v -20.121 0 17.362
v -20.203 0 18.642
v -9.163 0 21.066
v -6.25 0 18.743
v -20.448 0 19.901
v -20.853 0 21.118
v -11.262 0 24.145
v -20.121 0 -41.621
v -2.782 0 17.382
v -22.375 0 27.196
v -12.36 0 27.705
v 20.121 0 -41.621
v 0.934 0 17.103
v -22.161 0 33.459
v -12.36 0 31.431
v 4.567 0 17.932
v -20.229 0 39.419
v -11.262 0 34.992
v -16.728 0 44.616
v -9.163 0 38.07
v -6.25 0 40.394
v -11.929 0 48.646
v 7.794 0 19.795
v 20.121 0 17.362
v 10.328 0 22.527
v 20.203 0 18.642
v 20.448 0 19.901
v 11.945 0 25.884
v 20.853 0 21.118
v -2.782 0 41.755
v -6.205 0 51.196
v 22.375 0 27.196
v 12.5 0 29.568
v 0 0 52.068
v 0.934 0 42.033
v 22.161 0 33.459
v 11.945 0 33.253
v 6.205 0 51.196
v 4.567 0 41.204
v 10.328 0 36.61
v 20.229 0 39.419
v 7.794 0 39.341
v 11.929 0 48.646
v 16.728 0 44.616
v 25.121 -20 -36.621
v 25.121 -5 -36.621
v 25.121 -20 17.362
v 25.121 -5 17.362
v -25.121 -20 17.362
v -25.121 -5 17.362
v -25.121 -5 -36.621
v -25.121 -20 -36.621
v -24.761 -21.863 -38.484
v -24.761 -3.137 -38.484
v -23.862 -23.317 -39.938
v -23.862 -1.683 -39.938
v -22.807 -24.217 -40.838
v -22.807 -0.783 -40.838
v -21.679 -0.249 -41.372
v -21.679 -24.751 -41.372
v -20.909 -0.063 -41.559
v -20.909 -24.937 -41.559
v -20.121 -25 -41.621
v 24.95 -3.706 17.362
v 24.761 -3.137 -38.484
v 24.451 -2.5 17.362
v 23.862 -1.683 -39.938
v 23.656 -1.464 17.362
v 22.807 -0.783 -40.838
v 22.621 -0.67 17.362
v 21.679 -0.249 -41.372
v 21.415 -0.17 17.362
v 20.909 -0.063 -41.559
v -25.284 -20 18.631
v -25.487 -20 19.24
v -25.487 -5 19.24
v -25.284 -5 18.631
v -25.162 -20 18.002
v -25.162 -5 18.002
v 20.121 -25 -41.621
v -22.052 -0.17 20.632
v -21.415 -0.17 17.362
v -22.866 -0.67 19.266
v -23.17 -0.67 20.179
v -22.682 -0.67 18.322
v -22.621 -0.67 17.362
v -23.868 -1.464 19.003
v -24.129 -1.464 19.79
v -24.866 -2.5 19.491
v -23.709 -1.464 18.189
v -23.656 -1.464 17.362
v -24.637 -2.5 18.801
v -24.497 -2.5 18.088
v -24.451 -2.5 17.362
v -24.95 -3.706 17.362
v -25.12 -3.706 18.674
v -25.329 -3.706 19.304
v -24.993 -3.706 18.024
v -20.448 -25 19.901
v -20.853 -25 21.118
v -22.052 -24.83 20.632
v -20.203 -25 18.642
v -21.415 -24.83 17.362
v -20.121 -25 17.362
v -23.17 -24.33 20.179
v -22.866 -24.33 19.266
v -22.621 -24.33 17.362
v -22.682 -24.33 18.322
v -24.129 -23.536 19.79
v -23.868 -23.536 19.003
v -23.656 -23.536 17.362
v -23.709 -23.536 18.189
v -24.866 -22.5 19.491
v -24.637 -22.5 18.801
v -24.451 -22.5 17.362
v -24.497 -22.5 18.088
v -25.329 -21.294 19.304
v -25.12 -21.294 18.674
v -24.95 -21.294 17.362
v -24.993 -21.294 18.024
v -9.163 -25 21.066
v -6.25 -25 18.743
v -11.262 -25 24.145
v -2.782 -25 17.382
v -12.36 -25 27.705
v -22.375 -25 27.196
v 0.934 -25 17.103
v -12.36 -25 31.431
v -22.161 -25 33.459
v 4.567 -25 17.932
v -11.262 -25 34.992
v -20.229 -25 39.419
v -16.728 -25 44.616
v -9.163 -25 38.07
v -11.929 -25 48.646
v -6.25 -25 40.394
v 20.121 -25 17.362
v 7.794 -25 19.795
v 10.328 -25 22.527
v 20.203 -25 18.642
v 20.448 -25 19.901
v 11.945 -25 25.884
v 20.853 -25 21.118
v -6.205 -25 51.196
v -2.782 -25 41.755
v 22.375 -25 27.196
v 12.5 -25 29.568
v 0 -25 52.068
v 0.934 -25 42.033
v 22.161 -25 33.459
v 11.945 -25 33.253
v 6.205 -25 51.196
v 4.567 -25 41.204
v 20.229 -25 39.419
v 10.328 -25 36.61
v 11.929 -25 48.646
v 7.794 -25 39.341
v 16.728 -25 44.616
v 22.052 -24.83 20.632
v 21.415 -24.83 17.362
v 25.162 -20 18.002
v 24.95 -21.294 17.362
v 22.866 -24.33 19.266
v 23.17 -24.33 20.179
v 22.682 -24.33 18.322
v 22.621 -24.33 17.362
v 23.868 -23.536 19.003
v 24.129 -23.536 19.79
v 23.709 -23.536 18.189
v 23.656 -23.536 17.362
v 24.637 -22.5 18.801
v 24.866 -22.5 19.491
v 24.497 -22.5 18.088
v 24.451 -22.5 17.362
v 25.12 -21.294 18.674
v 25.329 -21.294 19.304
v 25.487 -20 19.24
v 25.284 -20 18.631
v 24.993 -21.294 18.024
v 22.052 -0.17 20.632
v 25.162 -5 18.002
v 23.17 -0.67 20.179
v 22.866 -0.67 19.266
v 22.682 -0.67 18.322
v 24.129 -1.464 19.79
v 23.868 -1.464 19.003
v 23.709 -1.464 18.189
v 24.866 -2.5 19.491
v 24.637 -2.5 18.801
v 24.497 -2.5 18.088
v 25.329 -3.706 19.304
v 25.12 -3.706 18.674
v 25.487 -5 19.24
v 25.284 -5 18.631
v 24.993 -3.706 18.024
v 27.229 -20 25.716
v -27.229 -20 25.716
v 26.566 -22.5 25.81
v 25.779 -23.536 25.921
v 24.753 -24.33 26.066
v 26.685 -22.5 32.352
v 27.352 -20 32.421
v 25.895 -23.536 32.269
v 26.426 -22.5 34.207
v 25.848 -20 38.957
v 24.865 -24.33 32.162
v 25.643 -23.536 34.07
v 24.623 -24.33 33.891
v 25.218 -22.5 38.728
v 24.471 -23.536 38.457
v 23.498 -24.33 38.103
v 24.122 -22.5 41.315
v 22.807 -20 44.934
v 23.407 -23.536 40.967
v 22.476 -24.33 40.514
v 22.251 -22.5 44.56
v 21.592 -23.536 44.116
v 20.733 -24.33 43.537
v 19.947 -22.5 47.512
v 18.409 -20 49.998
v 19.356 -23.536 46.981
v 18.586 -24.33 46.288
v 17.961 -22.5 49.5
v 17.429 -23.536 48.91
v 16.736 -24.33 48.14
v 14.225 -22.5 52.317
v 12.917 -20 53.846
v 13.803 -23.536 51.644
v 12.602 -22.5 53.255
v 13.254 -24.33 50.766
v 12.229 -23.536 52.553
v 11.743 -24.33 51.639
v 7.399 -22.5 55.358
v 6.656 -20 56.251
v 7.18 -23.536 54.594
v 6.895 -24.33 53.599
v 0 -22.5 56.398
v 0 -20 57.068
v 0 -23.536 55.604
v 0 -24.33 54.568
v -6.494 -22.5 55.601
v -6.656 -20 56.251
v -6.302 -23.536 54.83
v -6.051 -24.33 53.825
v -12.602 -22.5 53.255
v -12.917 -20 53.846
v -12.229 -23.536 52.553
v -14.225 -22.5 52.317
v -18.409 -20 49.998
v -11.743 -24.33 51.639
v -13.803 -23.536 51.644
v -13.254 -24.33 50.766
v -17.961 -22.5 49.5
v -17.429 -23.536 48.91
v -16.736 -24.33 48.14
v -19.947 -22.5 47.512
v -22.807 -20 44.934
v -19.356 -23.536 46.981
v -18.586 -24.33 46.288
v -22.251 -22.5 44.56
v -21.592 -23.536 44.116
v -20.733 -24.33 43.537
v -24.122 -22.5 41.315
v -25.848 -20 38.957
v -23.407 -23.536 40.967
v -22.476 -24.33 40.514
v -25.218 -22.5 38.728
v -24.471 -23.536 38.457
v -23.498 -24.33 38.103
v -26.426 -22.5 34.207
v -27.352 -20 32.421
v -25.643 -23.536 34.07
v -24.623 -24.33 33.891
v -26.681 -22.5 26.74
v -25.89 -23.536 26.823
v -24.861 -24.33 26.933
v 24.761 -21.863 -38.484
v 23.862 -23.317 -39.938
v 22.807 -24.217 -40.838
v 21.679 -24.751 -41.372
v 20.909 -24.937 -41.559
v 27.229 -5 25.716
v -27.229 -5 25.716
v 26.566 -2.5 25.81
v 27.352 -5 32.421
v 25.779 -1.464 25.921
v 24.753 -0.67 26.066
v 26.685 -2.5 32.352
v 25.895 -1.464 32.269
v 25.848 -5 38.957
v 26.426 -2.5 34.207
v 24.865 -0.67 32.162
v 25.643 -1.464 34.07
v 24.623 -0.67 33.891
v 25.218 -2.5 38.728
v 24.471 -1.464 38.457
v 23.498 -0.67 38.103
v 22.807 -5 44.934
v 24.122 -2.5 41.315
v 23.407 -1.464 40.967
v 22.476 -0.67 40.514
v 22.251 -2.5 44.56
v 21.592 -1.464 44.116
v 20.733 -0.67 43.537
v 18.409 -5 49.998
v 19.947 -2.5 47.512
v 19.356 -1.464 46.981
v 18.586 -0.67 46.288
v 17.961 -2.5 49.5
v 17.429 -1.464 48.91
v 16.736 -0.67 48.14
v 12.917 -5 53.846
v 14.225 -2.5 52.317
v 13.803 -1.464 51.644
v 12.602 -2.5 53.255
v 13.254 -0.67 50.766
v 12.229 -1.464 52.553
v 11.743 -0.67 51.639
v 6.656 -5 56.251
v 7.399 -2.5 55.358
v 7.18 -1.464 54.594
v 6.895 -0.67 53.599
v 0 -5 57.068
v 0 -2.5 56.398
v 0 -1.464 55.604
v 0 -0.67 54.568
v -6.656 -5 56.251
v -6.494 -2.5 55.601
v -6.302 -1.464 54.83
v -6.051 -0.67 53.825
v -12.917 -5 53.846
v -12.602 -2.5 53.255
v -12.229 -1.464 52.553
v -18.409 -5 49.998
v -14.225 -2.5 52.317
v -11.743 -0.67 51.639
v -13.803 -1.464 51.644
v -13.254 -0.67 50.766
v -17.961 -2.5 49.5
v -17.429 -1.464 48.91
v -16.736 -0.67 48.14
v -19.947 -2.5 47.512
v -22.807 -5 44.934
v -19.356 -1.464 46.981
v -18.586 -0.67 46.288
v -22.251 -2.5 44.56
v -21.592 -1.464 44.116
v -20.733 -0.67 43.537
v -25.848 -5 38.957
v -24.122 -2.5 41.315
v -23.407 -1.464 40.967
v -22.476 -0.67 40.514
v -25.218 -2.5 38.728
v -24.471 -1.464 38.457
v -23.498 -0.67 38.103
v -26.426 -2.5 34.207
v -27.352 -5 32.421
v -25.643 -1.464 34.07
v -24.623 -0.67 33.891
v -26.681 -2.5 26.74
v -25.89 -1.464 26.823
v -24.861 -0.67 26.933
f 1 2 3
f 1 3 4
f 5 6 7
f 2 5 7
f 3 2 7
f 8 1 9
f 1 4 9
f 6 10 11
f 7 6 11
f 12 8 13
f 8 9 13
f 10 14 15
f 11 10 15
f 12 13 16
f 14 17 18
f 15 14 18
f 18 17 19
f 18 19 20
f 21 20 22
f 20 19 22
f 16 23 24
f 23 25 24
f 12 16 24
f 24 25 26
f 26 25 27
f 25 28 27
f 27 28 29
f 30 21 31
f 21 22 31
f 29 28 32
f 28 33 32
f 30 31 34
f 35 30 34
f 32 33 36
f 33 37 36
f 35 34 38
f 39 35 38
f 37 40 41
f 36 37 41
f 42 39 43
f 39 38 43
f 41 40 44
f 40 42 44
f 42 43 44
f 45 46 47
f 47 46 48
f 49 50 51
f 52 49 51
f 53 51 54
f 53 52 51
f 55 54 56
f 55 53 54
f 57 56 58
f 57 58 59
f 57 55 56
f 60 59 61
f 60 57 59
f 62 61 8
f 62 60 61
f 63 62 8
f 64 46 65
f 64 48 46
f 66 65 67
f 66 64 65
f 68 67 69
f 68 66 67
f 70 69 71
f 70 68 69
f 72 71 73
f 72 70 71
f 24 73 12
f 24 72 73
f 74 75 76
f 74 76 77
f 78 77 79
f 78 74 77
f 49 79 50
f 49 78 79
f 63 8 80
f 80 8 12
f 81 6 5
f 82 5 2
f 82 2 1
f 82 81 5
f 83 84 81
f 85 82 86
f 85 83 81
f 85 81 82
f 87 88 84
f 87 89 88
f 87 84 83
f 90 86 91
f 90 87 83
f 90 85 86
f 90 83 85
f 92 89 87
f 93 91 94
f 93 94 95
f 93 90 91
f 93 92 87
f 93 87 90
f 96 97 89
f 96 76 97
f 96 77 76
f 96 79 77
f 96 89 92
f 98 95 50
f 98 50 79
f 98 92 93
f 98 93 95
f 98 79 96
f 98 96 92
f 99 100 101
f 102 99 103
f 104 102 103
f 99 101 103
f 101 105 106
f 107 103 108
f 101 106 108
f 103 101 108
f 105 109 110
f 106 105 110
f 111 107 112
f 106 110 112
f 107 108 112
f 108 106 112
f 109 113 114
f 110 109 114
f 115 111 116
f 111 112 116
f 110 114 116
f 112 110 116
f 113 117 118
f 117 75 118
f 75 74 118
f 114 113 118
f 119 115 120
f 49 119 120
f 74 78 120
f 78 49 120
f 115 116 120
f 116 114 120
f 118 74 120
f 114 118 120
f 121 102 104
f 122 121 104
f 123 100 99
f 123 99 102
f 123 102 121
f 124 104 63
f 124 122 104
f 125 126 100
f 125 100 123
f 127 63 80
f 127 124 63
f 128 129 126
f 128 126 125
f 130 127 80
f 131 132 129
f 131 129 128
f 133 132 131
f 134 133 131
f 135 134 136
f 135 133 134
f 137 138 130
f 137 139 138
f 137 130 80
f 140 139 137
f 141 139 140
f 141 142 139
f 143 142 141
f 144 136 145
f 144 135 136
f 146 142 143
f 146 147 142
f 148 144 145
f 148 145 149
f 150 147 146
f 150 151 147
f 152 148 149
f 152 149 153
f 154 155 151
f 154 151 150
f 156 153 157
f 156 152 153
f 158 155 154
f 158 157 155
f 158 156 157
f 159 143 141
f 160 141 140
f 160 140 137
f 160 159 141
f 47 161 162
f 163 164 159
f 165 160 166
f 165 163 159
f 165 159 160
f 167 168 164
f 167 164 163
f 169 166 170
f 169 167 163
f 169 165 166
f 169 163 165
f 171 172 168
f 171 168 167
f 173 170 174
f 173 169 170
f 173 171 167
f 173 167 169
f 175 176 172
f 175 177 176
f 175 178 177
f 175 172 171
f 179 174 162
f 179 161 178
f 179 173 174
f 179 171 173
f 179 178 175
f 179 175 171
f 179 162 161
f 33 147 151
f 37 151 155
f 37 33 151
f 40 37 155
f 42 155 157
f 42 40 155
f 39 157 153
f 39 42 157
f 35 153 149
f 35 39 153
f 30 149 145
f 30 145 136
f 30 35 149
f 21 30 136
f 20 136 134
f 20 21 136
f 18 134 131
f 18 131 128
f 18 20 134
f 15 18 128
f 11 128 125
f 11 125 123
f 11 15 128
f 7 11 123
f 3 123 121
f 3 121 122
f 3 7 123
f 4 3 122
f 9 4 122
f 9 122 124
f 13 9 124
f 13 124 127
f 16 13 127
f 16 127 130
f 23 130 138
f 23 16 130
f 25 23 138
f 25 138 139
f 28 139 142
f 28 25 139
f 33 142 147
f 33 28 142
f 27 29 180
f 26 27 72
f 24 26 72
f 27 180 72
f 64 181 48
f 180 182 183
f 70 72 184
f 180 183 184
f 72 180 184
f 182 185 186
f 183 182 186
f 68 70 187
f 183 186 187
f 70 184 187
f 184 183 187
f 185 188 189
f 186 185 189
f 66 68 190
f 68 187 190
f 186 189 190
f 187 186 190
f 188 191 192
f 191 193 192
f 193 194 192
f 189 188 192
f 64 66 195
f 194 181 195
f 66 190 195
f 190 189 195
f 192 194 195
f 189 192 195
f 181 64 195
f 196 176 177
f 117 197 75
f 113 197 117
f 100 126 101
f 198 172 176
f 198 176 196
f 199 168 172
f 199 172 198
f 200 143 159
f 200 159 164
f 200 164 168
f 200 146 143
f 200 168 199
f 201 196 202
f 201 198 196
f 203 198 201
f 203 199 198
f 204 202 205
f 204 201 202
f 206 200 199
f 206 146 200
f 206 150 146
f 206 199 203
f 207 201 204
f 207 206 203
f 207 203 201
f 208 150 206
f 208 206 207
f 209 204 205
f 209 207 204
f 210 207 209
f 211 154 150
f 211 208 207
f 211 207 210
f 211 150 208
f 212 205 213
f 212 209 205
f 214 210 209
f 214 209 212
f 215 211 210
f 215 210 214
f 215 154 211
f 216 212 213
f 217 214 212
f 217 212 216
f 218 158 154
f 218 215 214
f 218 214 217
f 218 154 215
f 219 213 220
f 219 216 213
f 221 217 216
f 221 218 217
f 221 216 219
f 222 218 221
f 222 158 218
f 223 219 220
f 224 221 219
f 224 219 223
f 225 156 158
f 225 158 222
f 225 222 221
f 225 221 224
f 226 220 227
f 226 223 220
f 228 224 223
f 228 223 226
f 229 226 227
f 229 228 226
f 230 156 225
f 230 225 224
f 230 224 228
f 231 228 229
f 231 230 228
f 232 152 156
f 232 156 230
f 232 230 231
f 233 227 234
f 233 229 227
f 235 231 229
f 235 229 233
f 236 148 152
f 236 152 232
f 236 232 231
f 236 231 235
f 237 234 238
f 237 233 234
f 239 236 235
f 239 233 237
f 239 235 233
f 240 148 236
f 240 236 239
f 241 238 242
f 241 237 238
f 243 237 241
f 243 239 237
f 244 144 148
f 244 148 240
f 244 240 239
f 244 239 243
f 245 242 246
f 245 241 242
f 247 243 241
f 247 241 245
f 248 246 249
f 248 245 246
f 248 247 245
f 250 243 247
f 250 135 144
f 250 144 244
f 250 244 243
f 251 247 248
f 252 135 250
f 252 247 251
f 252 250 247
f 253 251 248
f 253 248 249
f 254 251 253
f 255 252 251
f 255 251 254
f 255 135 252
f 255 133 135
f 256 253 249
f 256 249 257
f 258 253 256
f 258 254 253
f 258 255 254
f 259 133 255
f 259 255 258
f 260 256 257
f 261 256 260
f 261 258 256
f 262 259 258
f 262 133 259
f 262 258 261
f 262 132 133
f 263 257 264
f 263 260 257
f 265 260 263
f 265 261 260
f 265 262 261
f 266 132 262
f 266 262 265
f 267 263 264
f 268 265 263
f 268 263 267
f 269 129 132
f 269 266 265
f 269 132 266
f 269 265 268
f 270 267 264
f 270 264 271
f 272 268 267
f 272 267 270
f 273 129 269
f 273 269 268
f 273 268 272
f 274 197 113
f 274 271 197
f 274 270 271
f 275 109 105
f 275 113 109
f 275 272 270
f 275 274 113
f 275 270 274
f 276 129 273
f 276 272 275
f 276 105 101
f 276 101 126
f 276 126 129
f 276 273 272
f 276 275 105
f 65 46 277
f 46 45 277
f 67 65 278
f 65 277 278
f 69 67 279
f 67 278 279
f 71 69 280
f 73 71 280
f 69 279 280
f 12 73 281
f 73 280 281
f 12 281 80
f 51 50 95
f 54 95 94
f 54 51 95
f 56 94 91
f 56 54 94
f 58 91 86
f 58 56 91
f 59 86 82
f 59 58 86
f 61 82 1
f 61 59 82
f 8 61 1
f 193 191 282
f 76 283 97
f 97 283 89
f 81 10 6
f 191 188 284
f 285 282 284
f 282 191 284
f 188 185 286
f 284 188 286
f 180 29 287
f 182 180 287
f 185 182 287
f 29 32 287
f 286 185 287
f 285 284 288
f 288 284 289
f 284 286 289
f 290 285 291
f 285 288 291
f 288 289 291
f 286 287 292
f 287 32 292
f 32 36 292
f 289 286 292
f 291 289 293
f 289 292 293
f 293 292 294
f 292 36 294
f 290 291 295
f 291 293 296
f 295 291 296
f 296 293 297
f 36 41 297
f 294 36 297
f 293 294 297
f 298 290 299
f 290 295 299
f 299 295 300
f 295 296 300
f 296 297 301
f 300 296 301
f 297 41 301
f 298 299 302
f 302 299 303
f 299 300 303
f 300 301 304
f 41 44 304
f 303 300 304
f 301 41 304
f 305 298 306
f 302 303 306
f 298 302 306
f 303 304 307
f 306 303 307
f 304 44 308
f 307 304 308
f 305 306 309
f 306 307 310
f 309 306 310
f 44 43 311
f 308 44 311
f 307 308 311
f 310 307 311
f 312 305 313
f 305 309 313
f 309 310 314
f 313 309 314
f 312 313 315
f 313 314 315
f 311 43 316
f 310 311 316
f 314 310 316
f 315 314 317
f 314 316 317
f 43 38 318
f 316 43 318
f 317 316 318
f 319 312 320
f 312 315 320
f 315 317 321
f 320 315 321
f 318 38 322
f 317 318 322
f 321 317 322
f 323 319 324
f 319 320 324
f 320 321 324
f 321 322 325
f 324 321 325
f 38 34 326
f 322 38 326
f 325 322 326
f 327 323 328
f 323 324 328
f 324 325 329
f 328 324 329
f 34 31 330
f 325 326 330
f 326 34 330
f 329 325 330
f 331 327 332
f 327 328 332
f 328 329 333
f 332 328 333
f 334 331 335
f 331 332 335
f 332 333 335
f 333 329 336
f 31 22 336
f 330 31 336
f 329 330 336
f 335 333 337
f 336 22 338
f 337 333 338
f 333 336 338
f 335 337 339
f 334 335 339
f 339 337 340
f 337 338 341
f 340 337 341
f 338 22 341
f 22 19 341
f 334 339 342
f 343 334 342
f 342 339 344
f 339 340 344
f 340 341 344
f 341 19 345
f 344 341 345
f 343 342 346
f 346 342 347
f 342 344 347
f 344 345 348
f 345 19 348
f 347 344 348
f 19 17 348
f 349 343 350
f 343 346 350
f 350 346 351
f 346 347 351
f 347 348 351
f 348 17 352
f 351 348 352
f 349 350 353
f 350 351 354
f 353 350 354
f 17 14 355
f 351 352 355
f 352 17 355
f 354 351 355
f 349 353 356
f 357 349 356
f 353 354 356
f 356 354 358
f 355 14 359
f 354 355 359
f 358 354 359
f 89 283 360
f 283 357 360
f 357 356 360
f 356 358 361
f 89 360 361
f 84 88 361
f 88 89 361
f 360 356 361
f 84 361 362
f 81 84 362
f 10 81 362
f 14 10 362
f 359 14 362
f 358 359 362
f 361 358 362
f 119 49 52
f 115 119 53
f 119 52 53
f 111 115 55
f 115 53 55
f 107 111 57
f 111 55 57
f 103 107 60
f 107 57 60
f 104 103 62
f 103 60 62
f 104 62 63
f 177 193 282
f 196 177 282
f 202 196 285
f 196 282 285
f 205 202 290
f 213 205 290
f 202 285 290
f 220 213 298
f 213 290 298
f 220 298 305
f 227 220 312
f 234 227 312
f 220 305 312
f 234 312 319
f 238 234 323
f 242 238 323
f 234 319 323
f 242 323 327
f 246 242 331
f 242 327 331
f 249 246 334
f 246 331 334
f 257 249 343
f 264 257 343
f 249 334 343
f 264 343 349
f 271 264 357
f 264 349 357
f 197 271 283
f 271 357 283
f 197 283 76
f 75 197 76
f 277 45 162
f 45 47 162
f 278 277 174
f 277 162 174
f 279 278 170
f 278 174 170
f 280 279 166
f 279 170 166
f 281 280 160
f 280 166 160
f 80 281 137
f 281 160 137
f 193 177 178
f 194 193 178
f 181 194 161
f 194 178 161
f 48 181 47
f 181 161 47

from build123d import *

# Parameters (mm, degrees)
F0_R     = 12.5
F1_DEPTH = 25
F2_R     = 5


with BuildPart() as f1:
    # F0 (on Front) → F1 (new body)
    with BuildSketch(Plane.XZ):
        with BuildLine():
            ThreePointArc((25.1206115917, 18.3788214192), (0, 57.0683197663), (-25.1206115917, 18.3788214192))
            Line((-25.1206115917, 18.3788214192), (-25.1206115917, -41.6211785808))
            Line((-25.1206115917, -41.6211785808), (25.1206115917, -41.6211785808))
            Line((25.1206115917, -41.6211785808), (25.1206115917, 18.3788214192))
        make_face()
        with Locations((0, 29.5683197663)):
            Circle(F0_R, mode=Mode.SUBTRACT)
    extrude(amount=F1_DEPTH)

    # F2
    f2_edges = [f1.edges().sort_by_distance(p)[0] for p in [
        (-25.120612, -12.5, -41.621179),
        (25.120612, -12.5, -41.621179),
        (-25.120612, -12.5, 18.378821),
        (25.120612, -12.5, 18.378821),
        (0, 0, 57.06832),
        (0, -25, 57.06832),
        (25.120612, 0, -11.621179),
        (25.120612, -25, -11.621179),
        (-25.120612, 0, -11.621179),
        (-25.120612, -25, -11.621179),
    ]]
    fillet(f2_edges, radius=F2_R)


solid = f1.part
